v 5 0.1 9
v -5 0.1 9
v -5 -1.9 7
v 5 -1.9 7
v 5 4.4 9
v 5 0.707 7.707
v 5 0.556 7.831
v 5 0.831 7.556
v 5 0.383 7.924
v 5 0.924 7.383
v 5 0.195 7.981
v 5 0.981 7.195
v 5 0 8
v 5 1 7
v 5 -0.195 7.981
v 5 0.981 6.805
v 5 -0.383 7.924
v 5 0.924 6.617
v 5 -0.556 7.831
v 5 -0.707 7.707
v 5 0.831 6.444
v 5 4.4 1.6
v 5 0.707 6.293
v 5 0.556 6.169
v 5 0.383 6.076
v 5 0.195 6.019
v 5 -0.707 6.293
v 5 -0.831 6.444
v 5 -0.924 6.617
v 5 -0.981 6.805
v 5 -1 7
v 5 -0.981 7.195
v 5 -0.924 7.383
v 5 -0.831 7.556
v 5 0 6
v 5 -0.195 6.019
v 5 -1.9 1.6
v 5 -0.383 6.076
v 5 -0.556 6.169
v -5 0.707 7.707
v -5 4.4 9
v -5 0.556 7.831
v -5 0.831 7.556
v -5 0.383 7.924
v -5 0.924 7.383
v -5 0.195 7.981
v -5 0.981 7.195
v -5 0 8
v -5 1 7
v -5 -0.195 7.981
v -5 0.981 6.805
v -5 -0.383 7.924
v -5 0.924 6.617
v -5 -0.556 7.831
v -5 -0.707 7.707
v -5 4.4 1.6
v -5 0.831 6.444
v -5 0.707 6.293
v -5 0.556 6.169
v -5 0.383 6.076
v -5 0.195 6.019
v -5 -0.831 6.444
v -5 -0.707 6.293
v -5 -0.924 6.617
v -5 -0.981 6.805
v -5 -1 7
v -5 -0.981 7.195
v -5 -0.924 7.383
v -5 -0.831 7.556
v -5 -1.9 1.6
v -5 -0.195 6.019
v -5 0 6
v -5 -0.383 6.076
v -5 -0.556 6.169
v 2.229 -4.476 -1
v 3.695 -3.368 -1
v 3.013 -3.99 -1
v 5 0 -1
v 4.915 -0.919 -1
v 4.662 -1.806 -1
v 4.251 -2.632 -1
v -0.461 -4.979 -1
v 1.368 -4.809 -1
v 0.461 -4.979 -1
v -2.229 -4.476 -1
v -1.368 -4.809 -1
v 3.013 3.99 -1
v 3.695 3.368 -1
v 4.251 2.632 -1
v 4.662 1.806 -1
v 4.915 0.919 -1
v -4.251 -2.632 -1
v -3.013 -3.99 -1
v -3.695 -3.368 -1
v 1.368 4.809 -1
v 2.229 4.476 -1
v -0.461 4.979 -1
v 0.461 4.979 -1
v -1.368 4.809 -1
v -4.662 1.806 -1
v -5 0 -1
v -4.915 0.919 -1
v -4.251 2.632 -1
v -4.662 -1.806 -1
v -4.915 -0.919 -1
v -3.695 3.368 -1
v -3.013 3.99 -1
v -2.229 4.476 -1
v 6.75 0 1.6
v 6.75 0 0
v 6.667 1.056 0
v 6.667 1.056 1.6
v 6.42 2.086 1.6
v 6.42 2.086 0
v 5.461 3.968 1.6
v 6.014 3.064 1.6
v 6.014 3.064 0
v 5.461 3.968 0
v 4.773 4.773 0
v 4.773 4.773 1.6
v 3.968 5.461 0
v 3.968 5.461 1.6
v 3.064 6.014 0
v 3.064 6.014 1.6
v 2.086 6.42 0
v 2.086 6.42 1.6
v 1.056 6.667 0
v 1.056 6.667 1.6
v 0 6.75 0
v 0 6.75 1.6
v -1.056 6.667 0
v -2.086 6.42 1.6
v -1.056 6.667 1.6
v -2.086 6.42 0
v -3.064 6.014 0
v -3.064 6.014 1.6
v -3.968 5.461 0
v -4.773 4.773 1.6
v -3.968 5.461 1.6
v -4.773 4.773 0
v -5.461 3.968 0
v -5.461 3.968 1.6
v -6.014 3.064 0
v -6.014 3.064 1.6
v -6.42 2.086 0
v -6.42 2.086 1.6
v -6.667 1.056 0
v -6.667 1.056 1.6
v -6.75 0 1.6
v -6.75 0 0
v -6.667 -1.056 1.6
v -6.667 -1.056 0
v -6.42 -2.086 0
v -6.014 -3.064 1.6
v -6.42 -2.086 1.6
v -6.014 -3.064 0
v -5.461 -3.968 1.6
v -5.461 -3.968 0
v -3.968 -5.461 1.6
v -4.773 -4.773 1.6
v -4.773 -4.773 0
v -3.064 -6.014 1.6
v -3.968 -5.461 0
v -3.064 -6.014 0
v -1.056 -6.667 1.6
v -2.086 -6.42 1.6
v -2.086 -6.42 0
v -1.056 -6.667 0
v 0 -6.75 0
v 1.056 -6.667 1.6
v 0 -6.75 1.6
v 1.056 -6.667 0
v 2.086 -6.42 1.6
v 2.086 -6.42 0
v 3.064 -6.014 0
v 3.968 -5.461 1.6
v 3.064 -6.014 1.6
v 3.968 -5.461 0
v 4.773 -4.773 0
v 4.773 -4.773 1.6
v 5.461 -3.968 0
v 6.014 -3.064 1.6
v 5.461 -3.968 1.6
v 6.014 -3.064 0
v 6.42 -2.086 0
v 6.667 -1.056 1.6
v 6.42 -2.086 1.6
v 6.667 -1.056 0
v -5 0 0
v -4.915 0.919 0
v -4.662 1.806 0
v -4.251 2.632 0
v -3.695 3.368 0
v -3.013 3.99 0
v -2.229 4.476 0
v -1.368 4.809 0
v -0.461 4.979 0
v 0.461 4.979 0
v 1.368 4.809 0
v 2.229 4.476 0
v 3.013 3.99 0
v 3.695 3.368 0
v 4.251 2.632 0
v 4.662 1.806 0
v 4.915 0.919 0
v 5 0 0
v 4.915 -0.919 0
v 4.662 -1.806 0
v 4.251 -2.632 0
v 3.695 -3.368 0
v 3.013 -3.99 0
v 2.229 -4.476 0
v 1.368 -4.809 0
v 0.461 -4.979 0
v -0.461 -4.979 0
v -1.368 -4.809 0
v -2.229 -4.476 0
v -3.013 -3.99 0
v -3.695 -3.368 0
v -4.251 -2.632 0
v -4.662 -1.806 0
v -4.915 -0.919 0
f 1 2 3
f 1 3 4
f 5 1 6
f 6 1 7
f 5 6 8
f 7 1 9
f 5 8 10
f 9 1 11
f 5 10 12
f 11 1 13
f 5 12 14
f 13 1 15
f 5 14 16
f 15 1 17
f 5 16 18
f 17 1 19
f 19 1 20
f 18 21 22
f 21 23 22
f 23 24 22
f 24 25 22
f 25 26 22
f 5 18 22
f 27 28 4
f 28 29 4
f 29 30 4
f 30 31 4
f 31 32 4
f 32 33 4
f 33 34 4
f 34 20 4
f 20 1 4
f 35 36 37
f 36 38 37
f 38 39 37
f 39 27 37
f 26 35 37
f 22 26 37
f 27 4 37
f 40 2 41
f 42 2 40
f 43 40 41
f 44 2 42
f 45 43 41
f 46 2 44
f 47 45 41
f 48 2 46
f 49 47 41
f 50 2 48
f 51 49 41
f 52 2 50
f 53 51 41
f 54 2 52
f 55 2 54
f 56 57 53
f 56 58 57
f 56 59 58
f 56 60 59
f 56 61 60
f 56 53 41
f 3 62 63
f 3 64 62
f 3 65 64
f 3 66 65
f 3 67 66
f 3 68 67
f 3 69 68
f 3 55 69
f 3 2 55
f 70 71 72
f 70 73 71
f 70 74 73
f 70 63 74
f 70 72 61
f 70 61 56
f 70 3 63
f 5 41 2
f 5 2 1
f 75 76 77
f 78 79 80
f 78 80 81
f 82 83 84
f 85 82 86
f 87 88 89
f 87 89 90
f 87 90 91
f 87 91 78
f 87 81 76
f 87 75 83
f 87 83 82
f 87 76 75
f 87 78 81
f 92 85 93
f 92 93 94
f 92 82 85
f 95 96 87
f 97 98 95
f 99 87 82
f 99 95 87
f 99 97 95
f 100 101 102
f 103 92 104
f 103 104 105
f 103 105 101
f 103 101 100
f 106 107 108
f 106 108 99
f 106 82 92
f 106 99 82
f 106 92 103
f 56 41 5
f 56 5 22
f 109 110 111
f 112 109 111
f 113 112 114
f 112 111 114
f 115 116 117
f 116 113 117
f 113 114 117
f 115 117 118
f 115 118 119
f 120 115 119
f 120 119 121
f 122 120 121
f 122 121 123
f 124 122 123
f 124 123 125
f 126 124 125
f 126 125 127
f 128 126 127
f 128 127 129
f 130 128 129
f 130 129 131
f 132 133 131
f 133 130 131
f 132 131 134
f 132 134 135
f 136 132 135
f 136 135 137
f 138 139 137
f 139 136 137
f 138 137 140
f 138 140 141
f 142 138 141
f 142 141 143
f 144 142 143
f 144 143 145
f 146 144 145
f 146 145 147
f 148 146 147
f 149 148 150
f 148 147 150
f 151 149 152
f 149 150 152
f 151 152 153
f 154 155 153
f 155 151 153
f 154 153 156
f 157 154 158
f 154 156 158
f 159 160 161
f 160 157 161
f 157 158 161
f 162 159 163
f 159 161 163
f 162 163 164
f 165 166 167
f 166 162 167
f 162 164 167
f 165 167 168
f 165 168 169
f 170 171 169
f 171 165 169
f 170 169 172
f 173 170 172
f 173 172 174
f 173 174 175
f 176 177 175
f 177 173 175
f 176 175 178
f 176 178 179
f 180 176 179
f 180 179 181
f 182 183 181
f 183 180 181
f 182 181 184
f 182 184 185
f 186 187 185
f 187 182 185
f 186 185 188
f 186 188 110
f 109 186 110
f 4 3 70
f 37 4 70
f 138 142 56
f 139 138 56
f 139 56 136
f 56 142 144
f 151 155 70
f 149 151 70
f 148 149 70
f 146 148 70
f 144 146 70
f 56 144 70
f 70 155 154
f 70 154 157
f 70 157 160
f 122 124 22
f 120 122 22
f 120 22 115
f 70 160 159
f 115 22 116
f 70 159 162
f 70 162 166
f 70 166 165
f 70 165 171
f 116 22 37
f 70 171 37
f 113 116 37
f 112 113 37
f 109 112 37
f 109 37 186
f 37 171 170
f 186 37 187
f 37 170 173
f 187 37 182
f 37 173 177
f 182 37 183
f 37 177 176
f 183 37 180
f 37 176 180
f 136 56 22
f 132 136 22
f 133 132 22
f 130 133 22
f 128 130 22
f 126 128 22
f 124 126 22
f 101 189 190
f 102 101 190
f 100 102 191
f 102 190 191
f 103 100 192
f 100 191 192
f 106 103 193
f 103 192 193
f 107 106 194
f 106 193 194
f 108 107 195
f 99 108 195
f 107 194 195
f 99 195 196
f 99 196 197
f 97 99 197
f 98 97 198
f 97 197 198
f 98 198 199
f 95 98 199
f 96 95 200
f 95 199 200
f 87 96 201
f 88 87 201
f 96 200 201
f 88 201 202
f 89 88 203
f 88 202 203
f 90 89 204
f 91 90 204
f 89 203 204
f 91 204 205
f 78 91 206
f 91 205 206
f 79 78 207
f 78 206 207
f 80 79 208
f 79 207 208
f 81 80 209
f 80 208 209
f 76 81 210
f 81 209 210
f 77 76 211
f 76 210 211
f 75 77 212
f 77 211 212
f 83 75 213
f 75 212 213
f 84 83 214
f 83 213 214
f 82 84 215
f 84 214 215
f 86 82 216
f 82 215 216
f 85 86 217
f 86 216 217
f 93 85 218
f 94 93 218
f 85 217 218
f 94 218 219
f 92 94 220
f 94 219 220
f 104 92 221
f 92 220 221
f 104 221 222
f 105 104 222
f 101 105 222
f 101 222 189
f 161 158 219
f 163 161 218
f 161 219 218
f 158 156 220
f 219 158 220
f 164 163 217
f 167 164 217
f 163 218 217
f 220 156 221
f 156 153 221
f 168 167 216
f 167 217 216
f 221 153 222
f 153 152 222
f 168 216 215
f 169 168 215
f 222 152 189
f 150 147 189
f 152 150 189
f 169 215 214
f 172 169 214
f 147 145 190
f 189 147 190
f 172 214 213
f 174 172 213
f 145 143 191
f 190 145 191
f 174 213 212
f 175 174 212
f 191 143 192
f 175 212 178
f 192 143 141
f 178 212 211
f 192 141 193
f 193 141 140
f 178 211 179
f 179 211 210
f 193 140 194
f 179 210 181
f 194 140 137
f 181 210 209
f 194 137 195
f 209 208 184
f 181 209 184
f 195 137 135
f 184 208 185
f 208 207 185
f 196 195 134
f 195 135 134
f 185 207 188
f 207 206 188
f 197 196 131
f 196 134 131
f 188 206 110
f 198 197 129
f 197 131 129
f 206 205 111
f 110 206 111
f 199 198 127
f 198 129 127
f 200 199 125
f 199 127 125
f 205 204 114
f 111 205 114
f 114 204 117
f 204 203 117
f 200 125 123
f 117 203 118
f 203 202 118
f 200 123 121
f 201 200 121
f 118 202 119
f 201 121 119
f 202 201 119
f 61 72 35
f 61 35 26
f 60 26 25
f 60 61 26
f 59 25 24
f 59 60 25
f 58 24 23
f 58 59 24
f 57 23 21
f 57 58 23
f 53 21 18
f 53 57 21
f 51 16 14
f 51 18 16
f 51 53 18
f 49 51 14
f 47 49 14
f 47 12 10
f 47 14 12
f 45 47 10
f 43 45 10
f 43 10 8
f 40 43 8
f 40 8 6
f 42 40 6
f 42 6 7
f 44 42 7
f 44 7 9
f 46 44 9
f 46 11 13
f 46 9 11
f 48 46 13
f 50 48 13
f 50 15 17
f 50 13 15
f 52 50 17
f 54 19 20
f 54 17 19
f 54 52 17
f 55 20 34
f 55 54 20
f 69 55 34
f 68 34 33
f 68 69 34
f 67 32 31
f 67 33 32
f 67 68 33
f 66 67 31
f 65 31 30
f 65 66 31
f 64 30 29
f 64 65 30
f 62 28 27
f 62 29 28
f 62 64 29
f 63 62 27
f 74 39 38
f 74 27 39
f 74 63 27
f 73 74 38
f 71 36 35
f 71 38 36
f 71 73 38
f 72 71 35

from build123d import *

# Parameters (mm, degrees)
SKETCH1_R               = 6.75
BOSS_EXTRUDE1_DEPTH     = 9
SKETCH2_R               = 5
BOSS_EXTRUDE2_DEPTH     = 1
CUT_EXTRUDE1_DEPTH      = 14.119641763
CUT_EXTRUDE1_DEPTH_BACK = 14.119641763
SKETCH3_W               = 1.75
SKETCH3_H               = 7.4
CUT_EXTRUDE2_DEPTH      = 14.119641763
CUT_EXTRUDE2_DEPTH_BACK = 14.119641763
SKETCH4_W               = 7.4
SKETCH4_H               = 4.85
SKETCH4_H_2             = 2.35
CUT_EXTRUDE3_DEPTH      = 17.267298485
CUT_EXTRUDE3_DEPTH_BACK = 17.267298485
SKETCH5_R               = 1
CHAMFER1_SIZE           = 2


with BuildPart() as part:
    # Sketch1 → Boss-Extrude1 (new body)
    with BuildSketch(Plane.XY):
        Circle(SKETCH1_R)
    extrude(amount=BOSS_EXTRUDE1_DEPTH)

    # Sketch2 → Boss-Extrude2 (add)
    with BuildSketch(Plane(origin=(0, 0, 0), x_dir=(-1, 0, 0), z_dir=(0, 0, -1))):
        Circle(SKETCH2_R)
    extrude(amount=BOSS_EXTRUDE2_DEPTH)

    # Sketch3 → Cut-Extrude1 (cut, two sides: drawn at the far end of the back side and taken through both)
    with BuildSketch(Plane(origin=(0, 0, 0), x_dir=(1, 0, 0), z_dir=(0, 1, 0)).offset(-CUT_EXTRUDE1_DEPTH_BACK)):
        with Locations((-5.875, -5.3)):
            Rectangle(SKETCH3_W, SKETCH3_H)
        with Locations((5.875, -5.3)):
            Rectangle(SKETCH3_W, SKETCH3_H)
    extrude(amount=CUT_EXTRUDE1_DEPTH + CUT_EXTRUDE1_DEPTH_BACK, mode=Mode.SUBTRACT)

    # Sketch4 → Cut-Extrude2 (cut, two sides: drawn at the far end of the back side and taken through both)
    with BuildSketch(Plane(origin=(0, 0, 0), x_dir=(0, 0, -1), z_dir=(1, 0, 0)).offset(-CUT_EXTRUDE2_DEPTH_BACK)):
        with Locations((-5.3, -4.325)):
            Rectangle(SKETCH4_W, SKETCH4_H)
        with Locations((-5.3, 5.575)):
            Rectangle(SKETCH4_W, SKETCH4_H_2)
    extrude(amount=CUT_EXTRUDE2_DEPTH + CUT_EXTRUDE2_DEPTH_BACK, mode=Mode.SUBTRACT)

    # Sketch5 → Cut-Extrude3 (cut, two sides: drawn at the far end of the back side and taken through both)
    with BuildSketch(Plane(origin=(5, 0, 0), x_dir=(0, 0, -1), z_dir=(1, 0, 0)).offset(-CUT_EXTRUDE3_DEPTH_BACK)):
        with Locations((-7, 0)):
            Circle(SKETCH5_R)
    extrude(amount=CUT_EXTRUDE3_DEPTH + CUT_EXTRUDE3_DEPTH_BACK, mode=Mode.SUBTRACT)

    # Chamfer1
    chamfer1_edges = [part.edges().sort_by_distance(p)[0] for p in [
        (0, -1.9, 9),
    ]]
    chamfer(chamfer1_edges, length=CHAMFER1_SIZE)


solid = part.part
